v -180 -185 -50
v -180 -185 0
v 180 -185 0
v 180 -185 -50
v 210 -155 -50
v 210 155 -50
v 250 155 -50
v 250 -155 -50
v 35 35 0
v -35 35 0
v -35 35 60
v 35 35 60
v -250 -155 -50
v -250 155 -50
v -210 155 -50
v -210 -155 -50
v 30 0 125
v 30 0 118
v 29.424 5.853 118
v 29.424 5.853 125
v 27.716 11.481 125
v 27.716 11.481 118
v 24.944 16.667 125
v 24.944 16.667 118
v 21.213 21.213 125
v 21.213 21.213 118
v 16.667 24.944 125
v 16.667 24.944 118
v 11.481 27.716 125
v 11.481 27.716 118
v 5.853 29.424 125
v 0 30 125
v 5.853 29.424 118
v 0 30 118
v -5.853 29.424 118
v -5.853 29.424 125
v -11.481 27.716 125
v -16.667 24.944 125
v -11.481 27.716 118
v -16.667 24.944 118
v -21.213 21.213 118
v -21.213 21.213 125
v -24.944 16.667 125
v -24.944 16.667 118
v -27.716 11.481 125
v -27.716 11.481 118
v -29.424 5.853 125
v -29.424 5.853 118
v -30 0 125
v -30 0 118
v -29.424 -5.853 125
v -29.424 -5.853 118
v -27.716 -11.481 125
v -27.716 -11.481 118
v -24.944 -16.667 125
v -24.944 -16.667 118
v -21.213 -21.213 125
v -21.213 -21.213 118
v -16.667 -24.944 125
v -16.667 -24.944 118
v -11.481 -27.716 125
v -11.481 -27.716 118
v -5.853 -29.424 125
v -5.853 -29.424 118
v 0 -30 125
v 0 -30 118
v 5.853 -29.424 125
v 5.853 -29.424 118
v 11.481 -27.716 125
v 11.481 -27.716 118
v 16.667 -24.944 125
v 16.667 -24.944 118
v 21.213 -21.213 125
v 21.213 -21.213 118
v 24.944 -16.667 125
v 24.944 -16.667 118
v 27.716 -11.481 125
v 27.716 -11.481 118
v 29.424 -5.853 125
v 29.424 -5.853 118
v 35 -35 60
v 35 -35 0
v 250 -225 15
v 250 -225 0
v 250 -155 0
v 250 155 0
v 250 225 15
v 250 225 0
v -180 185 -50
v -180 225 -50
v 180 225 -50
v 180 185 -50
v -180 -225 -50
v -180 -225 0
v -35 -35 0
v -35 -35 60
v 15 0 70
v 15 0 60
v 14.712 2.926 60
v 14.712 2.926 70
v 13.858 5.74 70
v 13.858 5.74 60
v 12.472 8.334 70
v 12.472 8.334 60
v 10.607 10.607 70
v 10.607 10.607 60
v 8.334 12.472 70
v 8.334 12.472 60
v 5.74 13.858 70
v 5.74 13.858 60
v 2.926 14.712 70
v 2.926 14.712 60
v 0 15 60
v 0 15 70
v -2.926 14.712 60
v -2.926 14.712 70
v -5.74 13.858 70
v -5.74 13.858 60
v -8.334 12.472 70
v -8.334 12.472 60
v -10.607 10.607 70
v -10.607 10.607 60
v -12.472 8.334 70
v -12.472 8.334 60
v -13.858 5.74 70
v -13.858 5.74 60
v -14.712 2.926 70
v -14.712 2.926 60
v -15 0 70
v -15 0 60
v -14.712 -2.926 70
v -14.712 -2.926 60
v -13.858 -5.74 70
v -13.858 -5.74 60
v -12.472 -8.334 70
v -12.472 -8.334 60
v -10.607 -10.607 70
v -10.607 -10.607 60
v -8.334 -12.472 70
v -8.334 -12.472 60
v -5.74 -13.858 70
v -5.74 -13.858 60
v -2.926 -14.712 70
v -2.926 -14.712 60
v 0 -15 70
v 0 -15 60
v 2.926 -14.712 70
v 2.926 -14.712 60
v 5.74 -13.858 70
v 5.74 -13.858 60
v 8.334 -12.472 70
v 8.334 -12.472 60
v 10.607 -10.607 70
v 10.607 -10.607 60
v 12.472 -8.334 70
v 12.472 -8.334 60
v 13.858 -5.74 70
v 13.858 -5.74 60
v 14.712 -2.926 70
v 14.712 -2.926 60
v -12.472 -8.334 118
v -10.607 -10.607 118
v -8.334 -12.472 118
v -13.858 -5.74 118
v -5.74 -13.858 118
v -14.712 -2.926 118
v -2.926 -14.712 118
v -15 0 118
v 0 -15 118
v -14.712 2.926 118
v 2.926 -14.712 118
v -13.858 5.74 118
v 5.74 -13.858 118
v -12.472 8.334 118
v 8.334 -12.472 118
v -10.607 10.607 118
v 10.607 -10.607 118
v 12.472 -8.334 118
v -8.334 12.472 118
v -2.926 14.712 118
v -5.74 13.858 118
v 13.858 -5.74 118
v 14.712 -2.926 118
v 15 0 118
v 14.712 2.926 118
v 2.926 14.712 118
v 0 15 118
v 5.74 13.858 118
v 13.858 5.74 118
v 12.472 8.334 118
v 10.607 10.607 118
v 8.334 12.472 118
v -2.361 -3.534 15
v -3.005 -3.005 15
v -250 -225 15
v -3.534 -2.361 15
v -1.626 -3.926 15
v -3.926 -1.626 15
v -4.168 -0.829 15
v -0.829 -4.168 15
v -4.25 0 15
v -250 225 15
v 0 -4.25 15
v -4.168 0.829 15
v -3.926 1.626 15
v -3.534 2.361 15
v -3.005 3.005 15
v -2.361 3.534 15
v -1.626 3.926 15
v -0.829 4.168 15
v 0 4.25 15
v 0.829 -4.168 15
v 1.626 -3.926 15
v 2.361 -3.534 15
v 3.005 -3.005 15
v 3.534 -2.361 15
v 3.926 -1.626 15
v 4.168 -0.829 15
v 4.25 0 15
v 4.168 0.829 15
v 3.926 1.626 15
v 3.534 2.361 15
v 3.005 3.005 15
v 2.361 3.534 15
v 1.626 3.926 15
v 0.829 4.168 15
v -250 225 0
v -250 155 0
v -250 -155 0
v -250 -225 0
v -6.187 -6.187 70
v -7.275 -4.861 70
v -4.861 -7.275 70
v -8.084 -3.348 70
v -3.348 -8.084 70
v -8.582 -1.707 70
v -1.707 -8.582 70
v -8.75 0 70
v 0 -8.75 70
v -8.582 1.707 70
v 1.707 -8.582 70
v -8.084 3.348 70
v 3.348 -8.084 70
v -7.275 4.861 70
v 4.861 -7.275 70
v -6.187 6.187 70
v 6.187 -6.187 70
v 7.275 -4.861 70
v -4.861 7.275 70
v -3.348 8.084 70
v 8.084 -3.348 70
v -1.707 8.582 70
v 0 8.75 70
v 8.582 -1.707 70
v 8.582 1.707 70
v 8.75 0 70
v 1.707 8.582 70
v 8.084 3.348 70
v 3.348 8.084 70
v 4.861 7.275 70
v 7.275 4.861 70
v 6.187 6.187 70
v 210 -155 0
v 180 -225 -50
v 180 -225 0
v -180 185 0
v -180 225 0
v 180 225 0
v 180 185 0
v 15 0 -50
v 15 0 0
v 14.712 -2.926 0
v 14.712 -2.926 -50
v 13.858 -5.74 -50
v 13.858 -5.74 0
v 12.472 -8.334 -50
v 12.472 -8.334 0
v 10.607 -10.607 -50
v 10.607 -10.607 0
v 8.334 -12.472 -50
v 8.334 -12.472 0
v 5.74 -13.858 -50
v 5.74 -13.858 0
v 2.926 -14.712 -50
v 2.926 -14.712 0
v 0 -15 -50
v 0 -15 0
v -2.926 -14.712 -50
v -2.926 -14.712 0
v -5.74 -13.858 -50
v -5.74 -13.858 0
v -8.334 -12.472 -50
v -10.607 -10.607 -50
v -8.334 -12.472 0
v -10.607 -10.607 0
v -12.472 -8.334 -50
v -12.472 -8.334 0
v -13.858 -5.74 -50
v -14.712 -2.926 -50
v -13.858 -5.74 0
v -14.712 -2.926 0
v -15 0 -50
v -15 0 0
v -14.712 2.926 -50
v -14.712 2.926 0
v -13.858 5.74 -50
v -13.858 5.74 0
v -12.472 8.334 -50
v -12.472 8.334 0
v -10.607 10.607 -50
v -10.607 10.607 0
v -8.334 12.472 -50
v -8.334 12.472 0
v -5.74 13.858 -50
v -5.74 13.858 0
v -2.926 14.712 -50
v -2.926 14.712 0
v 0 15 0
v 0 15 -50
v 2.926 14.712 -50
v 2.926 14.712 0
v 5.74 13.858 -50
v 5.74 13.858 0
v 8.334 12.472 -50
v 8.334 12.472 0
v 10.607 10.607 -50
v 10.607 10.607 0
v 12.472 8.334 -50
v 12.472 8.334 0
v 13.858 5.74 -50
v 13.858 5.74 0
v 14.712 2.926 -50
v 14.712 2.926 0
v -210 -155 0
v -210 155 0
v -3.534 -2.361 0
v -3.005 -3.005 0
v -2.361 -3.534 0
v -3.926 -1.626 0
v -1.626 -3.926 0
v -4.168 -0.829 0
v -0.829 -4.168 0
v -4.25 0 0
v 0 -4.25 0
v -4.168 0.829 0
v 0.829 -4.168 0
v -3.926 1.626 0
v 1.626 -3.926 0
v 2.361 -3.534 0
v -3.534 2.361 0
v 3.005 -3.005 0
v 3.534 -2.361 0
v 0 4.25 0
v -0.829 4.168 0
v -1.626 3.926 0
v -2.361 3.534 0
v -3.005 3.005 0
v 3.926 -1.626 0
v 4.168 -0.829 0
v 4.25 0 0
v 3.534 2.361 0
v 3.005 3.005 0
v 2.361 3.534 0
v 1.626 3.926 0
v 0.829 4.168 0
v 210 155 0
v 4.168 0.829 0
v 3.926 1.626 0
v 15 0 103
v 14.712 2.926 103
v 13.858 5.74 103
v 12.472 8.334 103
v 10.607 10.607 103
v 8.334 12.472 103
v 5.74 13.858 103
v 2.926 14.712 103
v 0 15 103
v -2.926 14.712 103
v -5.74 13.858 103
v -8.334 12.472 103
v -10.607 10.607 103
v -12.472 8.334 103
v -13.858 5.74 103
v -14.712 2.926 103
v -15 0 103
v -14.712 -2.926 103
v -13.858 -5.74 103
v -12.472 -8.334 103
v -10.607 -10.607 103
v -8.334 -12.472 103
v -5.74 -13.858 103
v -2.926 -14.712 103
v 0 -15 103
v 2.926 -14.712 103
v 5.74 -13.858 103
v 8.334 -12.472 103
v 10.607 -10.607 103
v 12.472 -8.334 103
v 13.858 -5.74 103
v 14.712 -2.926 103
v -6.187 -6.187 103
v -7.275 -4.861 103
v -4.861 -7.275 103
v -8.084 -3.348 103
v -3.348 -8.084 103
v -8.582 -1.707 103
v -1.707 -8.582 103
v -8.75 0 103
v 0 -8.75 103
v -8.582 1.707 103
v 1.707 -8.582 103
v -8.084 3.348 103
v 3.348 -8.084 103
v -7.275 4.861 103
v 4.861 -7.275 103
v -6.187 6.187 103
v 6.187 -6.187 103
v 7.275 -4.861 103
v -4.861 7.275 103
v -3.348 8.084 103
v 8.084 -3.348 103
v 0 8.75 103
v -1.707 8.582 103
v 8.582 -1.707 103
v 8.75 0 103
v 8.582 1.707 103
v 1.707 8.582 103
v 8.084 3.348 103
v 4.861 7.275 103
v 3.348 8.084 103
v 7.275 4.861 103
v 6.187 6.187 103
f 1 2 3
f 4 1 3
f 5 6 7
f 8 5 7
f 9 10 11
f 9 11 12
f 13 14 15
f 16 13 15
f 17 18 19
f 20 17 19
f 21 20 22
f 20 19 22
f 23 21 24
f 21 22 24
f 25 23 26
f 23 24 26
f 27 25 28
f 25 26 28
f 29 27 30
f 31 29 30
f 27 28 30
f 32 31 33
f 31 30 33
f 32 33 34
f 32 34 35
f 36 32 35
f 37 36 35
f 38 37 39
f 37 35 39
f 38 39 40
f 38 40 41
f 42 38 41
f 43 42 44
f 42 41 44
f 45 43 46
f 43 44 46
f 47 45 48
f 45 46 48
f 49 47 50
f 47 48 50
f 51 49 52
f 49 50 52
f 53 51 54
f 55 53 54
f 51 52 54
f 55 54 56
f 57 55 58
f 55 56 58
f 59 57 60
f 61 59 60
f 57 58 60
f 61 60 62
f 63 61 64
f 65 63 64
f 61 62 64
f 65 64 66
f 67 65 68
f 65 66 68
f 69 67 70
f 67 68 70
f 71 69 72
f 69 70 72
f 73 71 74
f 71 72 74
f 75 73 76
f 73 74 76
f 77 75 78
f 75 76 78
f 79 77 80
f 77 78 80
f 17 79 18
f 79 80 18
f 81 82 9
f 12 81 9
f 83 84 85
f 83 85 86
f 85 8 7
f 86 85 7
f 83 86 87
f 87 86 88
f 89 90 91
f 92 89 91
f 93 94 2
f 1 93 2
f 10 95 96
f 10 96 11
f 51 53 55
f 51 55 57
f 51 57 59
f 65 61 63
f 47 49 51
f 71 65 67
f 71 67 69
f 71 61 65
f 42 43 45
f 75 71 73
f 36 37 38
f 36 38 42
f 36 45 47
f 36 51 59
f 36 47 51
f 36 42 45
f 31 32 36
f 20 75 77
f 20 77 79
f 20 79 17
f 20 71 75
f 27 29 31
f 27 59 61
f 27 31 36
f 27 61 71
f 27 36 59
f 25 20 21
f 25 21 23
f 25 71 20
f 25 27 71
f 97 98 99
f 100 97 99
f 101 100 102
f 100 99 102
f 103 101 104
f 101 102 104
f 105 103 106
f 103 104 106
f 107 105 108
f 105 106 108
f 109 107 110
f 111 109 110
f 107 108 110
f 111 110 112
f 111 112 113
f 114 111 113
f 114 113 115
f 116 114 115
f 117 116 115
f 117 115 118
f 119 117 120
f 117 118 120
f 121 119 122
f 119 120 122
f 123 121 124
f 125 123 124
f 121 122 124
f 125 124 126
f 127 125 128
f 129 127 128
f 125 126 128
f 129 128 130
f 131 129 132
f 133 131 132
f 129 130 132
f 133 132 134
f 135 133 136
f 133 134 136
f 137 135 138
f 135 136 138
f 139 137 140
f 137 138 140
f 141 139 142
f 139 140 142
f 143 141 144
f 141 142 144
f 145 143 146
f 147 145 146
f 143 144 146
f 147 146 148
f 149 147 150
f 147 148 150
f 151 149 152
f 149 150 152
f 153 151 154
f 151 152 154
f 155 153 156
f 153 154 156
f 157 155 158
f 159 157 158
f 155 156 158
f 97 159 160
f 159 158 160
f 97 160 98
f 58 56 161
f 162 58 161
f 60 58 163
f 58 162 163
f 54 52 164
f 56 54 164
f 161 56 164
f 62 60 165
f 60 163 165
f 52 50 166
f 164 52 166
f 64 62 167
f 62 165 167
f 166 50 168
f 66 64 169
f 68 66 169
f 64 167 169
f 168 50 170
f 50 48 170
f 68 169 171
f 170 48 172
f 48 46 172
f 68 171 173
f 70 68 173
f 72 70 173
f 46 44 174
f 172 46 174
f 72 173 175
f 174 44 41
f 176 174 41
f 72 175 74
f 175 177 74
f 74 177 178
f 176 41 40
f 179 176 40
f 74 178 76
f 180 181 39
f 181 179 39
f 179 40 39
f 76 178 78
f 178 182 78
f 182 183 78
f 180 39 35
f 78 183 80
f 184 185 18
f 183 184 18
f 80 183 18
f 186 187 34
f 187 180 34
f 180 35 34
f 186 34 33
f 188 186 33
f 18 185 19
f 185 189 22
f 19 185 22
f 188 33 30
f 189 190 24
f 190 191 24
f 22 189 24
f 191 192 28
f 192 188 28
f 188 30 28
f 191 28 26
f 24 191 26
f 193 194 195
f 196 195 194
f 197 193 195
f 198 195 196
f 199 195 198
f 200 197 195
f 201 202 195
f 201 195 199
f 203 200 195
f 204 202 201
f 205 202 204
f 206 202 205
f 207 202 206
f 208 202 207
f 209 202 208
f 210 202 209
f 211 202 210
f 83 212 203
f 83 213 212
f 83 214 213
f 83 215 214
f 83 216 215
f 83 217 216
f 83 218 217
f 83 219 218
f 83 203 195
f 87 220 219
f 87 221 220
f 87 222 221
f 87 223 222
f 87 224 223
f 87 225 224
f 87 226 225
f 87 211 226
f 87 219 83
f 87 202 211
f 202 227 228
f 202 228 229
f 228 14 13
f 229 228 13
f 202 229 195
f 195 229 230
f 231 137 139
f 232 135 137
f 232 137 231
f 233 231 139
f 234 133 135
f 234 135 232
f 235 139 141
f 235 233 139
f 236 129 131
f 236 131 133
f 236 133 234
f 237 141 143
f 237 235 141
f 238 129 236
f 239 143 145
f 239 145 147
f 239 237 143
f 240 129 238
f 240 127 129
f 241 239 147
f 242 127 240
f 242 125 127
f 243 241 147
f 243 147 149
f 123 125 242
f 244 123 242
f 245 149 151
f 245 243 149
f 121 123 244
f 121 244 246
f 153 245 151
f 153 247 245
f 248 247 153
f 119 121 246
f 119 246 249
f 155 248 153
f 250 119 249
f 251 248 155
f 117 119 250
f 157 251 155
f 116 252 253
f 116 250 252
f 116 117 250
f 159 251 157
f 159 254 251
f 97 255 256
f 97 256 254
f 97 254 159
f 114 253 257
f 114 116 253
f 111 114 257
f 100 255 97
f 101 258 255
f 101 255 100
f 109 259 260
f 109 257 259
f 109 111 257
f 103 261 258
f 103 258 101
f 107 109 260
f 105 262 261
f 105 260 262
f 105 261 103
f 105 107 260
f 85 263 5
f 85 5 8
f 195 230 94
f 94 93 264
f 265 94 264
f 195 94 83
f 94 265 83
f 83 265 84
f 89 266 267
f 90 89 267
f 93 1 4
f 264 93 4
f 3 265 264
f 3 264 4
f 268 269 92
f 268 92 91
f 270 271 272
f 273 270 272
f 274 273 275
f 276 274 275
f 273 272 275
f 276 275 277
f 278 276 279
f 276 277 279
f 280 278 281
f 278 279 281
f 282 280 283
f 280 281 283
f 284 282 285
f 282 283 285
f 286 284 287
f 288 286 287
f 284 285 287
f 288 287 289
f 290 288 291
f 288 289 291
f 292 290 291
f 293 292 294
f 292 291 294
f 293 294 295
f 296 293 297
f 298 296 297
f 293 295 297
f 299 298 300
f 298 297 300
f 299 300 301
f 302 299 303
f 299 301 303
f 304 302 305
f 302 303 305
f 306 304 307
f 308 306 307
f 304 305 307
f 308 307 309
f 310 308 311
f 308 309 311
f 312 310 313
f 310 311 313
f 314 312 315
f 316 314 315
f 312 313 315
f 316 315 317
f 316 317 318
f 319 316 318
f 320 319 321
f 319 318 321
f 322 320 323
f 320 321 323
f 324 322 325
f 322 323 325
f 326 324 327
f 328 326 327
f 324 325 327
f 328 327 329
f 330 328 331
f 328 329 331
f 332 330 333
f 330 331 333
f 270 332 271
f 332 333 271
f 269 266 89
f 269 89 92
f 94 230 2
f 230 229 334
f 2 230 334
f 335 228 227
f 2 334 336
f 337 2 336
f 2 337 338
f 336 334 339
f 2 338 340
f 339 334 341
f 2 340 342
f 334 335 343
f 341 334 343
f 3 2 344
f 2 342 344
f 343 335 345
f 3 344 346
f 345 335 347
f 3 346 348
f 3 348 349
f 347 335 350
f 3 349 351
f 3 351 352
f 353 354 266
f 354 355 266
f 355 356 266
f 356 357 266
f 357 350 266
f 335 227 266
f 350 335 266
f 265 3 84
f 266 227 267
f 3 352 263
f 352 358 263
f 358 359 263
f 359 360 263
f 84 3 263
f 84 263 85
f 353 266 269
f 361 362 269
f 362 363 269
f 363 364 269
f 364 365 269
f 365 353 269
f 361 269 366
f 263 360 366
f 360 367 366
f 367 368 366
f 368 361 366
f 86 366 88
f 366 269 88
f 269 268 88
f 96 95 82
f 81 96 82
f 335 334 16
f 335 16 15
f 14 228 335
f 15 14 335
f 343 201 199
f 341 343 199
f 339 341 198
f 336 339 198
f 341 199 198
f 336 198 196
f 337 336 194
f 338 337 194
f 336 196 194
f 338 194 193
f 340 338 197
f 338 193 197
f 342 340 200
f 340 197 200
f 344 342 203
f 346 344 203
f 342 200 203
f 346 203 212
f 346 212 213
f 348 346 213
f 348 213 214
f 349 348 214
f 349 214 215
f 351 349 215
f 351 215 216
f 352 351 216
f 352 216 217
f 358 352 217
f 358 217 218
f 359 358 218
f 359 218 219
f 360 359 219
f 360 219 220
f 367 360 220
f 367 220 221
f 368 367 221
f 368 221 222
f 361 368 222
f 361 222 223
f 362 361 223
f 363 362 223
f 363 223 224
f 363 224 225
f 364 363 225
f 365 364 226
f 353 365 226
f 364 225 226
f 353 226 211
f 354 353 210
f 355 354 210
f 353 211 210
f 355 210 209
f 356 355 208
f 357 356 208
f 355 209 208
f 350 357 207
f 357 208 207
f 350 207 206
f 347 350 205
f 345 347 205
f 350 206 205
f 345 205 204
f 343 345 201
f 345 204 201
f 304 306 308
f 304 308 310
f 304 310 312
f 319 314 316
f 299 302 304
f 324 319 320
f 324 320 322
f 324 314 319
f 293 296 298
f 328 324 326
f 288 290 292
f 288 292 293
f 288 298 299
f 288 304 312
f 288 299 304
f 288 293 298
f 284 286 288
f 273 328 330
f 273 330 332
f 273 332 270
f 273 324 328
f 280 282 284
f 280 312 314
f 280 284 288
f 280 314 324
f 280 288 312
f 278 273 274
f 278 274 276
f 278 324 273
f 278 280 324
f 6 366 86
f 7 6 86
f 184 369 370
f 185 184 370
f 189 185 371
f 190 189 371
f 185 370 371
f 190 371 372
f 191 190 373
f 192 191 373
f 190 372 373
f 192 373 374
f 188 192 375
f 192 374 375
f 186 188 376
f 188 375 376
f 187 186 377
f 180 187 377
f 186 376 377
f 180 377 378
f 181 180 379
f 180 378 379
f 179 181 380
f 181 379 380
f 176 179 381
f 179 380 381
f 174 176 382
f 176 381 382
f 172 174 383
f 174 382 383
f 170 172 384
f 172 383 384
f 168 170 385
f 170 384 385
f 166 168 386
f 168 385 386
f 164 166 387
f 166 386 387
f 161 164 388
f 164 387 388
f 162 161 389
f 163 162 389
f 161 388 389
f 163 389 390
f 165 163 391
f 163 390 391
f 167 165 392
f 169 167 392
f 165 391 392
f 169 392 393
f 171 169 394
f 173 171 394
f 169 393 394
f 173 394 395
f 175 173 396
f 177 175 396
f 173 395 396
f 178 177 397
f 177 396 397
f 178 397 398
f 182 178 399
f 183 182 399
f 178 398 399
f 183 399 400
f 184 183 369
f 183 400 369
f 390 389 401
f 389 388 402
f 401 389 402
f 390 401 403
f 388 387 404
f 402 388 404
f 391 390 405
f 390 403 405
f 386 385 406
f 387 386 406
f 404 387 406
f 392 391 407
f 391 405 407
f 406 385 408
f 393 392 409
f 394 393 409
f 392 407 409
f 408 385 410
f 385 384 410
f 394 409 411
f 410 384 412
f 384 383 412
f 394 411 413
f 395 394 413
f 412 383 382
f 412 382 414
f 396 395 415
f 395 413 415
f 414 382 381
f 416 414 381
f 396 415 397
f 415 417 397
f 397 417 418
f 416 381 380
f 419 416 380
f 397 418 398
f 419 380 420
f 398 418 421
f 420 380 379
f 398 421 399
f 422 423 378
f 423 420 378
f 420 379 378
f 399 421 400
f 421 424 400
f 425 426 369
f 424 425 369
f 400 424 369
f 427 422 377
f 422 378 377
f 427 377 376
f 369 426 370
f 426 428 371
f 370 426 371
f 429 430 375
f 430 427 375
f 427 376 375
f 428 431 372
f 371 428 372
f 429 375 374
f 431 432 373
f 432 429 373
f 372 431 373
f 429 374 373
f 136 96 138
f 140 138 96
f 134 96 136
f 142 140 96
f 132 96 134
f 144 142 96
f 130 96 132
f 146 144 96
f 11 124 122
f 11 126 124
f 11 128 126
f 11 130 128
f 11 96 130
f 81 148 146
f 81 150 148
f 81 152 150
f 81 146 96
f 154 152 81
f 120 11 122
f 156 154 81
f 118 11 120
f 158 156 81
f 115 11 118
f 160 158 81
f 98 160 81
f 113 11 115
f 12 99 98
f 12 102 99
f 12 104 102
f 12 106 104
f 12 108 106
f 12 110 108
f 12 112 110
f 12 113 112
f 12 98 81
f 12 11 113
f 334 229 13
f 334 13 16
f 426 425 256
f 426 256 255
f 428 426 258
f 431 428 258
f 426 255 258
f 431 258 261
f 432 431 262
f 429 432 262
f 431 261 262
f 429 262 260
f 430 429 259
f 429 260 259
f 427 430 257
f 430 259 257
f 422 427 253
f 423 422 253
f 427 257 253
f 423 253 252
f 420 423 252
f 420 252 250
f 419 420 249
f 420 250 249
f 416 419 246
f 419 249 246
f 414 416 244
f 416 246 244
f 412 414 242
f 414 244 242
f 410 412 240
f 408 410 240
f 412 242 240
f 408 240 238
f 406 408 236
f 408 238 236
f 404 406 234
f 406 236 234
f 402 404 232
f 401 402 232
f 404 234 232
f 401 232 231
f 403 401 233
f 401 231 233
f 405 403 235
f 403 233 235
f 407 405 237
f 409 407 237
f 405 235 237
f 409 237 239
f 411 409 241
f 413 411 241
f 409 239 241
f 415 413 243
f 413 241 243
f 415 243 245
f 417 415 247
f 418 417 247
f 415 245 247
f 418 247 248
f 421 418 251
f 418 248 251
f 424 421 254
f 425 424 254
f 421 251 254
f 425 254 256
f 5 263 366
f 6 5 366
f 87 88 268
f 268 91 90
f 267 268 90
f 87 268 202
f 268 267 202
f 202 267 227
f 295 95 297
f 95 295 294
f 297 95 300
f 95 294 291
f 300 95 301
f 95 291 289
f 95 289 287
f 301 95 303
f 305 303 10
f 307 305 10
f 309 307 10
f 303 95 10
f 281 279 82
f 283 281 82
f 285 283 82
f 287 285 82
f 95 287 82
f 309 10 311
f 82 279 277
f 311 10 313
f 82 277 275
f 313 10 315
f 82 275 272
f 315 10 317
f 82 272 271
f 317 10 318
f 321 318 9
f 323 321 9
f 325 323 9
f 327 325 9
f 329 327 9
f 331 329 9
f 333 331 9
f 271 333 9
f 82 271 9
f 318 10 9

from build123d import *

# Parameters (mm, degrees)
F0_W      = 40
F0_H      = 310
F0_W_2    = 360
F0_H_2    = 40
F1_DEPTH  = 15
F2_DEPTH  = 50
F3_D      = 8.5
F4_W      = 70
F4_H      = 70
F5_DEPTH  = 60
F6_R      = 15
F7_DEPTH  = 10
F8_R      = 8.75
F9_DEPTH  = 33
F10_R     = 15
F10_R_2   = 8.75
F11_DEPTH = 15
F12_R     = 30
F12_R_2   = 15
F13_DEPTH = 7
F14_R     = 15
F15_DEPTH = 50


with BuildPart() as f1:
    # F0 (on Top) → F1 (new body)
    with BuildSketch(Plane.XY):
        Polygon((180, -225), (250, -225), (250, -155), (210, -155), (210, 155), (250, 155), (250, 225), (180, 225), (180, 185), (-180, 185), (-180, 225), (-250, 225), (-250, 155), (-210, 155), (-210, -155), (-250, -155), (-250, -225), (-180, -225), (-180, -185), (180, -185), align=None)
        with Locations((-230, 0)):
            Rectangle(F0_W, F0_H)
        with Locations((0, 205)):
            Rectangle(F0_W_2, F0_H_2)
        with Locations((230, 0)):
            Rectangle(F0_W, F0_H)
        with Locations((0, -205)):
            Rectangle(F0_W_2, F0_H_2)
    extrude(amount=F1_DEPTH)

    # F0 (on Top) → F2 (join)
    with BuildSketch(Plane.XY):
        with Locations((0, -205)):
            Rectangle(F0_W_2, F0_H_2)
        with Locations((-230, 0)):
            Rectangle(F0_W, F0_H)
        with Locations((0, 205)):
            Rectangle(F0_W_2, F0_H_2)
        with Locations((230, 0)):
            Rectangle(F0_W, F0_H)
    extrude(amount=-F2_DEPTH)

    # F3 (through all)
    with Locations(Plane(origin=(0, 0, 0), x_dir=(1, 0, 0), z_dir=(0, 0, -1))):
        with Locations((0, 0)):
            Hole(F3_D / 2)


with BuildPart() as f5:
    # F4 (on Top) → F5 (new body)
    with BuildSketch(Plane.XY):
        Rectangle(F4_W, F4_H)
    extrude(amount=F5_DEPTH)

    # F6 (on face) → F7 (join)
    with BuildSketch(Plane.XY.offset(60)):
        Circle(F6_R)
    extrude(amount=F7_DEPTH)

    # F8 (on face) → F9 (join)
    with BuildSketch(Plane.XY.offset(70)):
        Circle(F8_R)
    extrude(amount=F9_DEPTH)

    # F10 (on face) → F11 (join)
    with BuildSketch(Plane.XY.offset(103)):
        Circle(F10_R)
        Circle(F10_R_2, mode=Mode.SUBTRACT)
        Circle(F10_R_2)
    extrude(amount=F11_DEPTH)

    # F12 (on face) → F13 (join)
    with BuildSketch(Plane.XY.offset(118)):
        Circle(F12_R)
        Circle(F12_R_2, mode=Mode.SUBTRACT)
        Circle(F12_R_2)
    extrude(amount=F13_DEPTH)

    # F14 (on face) → F15 (join)
    with BuildSketch(Plane(origin=(0, 0, 0), x_dir=(1, 0, 0), z_dir=(0, 0, -1))):
        Circle(F14_R)
    extrude(amount=F15_DEPTH)


solid = Compound([f1.part, f5.part])
